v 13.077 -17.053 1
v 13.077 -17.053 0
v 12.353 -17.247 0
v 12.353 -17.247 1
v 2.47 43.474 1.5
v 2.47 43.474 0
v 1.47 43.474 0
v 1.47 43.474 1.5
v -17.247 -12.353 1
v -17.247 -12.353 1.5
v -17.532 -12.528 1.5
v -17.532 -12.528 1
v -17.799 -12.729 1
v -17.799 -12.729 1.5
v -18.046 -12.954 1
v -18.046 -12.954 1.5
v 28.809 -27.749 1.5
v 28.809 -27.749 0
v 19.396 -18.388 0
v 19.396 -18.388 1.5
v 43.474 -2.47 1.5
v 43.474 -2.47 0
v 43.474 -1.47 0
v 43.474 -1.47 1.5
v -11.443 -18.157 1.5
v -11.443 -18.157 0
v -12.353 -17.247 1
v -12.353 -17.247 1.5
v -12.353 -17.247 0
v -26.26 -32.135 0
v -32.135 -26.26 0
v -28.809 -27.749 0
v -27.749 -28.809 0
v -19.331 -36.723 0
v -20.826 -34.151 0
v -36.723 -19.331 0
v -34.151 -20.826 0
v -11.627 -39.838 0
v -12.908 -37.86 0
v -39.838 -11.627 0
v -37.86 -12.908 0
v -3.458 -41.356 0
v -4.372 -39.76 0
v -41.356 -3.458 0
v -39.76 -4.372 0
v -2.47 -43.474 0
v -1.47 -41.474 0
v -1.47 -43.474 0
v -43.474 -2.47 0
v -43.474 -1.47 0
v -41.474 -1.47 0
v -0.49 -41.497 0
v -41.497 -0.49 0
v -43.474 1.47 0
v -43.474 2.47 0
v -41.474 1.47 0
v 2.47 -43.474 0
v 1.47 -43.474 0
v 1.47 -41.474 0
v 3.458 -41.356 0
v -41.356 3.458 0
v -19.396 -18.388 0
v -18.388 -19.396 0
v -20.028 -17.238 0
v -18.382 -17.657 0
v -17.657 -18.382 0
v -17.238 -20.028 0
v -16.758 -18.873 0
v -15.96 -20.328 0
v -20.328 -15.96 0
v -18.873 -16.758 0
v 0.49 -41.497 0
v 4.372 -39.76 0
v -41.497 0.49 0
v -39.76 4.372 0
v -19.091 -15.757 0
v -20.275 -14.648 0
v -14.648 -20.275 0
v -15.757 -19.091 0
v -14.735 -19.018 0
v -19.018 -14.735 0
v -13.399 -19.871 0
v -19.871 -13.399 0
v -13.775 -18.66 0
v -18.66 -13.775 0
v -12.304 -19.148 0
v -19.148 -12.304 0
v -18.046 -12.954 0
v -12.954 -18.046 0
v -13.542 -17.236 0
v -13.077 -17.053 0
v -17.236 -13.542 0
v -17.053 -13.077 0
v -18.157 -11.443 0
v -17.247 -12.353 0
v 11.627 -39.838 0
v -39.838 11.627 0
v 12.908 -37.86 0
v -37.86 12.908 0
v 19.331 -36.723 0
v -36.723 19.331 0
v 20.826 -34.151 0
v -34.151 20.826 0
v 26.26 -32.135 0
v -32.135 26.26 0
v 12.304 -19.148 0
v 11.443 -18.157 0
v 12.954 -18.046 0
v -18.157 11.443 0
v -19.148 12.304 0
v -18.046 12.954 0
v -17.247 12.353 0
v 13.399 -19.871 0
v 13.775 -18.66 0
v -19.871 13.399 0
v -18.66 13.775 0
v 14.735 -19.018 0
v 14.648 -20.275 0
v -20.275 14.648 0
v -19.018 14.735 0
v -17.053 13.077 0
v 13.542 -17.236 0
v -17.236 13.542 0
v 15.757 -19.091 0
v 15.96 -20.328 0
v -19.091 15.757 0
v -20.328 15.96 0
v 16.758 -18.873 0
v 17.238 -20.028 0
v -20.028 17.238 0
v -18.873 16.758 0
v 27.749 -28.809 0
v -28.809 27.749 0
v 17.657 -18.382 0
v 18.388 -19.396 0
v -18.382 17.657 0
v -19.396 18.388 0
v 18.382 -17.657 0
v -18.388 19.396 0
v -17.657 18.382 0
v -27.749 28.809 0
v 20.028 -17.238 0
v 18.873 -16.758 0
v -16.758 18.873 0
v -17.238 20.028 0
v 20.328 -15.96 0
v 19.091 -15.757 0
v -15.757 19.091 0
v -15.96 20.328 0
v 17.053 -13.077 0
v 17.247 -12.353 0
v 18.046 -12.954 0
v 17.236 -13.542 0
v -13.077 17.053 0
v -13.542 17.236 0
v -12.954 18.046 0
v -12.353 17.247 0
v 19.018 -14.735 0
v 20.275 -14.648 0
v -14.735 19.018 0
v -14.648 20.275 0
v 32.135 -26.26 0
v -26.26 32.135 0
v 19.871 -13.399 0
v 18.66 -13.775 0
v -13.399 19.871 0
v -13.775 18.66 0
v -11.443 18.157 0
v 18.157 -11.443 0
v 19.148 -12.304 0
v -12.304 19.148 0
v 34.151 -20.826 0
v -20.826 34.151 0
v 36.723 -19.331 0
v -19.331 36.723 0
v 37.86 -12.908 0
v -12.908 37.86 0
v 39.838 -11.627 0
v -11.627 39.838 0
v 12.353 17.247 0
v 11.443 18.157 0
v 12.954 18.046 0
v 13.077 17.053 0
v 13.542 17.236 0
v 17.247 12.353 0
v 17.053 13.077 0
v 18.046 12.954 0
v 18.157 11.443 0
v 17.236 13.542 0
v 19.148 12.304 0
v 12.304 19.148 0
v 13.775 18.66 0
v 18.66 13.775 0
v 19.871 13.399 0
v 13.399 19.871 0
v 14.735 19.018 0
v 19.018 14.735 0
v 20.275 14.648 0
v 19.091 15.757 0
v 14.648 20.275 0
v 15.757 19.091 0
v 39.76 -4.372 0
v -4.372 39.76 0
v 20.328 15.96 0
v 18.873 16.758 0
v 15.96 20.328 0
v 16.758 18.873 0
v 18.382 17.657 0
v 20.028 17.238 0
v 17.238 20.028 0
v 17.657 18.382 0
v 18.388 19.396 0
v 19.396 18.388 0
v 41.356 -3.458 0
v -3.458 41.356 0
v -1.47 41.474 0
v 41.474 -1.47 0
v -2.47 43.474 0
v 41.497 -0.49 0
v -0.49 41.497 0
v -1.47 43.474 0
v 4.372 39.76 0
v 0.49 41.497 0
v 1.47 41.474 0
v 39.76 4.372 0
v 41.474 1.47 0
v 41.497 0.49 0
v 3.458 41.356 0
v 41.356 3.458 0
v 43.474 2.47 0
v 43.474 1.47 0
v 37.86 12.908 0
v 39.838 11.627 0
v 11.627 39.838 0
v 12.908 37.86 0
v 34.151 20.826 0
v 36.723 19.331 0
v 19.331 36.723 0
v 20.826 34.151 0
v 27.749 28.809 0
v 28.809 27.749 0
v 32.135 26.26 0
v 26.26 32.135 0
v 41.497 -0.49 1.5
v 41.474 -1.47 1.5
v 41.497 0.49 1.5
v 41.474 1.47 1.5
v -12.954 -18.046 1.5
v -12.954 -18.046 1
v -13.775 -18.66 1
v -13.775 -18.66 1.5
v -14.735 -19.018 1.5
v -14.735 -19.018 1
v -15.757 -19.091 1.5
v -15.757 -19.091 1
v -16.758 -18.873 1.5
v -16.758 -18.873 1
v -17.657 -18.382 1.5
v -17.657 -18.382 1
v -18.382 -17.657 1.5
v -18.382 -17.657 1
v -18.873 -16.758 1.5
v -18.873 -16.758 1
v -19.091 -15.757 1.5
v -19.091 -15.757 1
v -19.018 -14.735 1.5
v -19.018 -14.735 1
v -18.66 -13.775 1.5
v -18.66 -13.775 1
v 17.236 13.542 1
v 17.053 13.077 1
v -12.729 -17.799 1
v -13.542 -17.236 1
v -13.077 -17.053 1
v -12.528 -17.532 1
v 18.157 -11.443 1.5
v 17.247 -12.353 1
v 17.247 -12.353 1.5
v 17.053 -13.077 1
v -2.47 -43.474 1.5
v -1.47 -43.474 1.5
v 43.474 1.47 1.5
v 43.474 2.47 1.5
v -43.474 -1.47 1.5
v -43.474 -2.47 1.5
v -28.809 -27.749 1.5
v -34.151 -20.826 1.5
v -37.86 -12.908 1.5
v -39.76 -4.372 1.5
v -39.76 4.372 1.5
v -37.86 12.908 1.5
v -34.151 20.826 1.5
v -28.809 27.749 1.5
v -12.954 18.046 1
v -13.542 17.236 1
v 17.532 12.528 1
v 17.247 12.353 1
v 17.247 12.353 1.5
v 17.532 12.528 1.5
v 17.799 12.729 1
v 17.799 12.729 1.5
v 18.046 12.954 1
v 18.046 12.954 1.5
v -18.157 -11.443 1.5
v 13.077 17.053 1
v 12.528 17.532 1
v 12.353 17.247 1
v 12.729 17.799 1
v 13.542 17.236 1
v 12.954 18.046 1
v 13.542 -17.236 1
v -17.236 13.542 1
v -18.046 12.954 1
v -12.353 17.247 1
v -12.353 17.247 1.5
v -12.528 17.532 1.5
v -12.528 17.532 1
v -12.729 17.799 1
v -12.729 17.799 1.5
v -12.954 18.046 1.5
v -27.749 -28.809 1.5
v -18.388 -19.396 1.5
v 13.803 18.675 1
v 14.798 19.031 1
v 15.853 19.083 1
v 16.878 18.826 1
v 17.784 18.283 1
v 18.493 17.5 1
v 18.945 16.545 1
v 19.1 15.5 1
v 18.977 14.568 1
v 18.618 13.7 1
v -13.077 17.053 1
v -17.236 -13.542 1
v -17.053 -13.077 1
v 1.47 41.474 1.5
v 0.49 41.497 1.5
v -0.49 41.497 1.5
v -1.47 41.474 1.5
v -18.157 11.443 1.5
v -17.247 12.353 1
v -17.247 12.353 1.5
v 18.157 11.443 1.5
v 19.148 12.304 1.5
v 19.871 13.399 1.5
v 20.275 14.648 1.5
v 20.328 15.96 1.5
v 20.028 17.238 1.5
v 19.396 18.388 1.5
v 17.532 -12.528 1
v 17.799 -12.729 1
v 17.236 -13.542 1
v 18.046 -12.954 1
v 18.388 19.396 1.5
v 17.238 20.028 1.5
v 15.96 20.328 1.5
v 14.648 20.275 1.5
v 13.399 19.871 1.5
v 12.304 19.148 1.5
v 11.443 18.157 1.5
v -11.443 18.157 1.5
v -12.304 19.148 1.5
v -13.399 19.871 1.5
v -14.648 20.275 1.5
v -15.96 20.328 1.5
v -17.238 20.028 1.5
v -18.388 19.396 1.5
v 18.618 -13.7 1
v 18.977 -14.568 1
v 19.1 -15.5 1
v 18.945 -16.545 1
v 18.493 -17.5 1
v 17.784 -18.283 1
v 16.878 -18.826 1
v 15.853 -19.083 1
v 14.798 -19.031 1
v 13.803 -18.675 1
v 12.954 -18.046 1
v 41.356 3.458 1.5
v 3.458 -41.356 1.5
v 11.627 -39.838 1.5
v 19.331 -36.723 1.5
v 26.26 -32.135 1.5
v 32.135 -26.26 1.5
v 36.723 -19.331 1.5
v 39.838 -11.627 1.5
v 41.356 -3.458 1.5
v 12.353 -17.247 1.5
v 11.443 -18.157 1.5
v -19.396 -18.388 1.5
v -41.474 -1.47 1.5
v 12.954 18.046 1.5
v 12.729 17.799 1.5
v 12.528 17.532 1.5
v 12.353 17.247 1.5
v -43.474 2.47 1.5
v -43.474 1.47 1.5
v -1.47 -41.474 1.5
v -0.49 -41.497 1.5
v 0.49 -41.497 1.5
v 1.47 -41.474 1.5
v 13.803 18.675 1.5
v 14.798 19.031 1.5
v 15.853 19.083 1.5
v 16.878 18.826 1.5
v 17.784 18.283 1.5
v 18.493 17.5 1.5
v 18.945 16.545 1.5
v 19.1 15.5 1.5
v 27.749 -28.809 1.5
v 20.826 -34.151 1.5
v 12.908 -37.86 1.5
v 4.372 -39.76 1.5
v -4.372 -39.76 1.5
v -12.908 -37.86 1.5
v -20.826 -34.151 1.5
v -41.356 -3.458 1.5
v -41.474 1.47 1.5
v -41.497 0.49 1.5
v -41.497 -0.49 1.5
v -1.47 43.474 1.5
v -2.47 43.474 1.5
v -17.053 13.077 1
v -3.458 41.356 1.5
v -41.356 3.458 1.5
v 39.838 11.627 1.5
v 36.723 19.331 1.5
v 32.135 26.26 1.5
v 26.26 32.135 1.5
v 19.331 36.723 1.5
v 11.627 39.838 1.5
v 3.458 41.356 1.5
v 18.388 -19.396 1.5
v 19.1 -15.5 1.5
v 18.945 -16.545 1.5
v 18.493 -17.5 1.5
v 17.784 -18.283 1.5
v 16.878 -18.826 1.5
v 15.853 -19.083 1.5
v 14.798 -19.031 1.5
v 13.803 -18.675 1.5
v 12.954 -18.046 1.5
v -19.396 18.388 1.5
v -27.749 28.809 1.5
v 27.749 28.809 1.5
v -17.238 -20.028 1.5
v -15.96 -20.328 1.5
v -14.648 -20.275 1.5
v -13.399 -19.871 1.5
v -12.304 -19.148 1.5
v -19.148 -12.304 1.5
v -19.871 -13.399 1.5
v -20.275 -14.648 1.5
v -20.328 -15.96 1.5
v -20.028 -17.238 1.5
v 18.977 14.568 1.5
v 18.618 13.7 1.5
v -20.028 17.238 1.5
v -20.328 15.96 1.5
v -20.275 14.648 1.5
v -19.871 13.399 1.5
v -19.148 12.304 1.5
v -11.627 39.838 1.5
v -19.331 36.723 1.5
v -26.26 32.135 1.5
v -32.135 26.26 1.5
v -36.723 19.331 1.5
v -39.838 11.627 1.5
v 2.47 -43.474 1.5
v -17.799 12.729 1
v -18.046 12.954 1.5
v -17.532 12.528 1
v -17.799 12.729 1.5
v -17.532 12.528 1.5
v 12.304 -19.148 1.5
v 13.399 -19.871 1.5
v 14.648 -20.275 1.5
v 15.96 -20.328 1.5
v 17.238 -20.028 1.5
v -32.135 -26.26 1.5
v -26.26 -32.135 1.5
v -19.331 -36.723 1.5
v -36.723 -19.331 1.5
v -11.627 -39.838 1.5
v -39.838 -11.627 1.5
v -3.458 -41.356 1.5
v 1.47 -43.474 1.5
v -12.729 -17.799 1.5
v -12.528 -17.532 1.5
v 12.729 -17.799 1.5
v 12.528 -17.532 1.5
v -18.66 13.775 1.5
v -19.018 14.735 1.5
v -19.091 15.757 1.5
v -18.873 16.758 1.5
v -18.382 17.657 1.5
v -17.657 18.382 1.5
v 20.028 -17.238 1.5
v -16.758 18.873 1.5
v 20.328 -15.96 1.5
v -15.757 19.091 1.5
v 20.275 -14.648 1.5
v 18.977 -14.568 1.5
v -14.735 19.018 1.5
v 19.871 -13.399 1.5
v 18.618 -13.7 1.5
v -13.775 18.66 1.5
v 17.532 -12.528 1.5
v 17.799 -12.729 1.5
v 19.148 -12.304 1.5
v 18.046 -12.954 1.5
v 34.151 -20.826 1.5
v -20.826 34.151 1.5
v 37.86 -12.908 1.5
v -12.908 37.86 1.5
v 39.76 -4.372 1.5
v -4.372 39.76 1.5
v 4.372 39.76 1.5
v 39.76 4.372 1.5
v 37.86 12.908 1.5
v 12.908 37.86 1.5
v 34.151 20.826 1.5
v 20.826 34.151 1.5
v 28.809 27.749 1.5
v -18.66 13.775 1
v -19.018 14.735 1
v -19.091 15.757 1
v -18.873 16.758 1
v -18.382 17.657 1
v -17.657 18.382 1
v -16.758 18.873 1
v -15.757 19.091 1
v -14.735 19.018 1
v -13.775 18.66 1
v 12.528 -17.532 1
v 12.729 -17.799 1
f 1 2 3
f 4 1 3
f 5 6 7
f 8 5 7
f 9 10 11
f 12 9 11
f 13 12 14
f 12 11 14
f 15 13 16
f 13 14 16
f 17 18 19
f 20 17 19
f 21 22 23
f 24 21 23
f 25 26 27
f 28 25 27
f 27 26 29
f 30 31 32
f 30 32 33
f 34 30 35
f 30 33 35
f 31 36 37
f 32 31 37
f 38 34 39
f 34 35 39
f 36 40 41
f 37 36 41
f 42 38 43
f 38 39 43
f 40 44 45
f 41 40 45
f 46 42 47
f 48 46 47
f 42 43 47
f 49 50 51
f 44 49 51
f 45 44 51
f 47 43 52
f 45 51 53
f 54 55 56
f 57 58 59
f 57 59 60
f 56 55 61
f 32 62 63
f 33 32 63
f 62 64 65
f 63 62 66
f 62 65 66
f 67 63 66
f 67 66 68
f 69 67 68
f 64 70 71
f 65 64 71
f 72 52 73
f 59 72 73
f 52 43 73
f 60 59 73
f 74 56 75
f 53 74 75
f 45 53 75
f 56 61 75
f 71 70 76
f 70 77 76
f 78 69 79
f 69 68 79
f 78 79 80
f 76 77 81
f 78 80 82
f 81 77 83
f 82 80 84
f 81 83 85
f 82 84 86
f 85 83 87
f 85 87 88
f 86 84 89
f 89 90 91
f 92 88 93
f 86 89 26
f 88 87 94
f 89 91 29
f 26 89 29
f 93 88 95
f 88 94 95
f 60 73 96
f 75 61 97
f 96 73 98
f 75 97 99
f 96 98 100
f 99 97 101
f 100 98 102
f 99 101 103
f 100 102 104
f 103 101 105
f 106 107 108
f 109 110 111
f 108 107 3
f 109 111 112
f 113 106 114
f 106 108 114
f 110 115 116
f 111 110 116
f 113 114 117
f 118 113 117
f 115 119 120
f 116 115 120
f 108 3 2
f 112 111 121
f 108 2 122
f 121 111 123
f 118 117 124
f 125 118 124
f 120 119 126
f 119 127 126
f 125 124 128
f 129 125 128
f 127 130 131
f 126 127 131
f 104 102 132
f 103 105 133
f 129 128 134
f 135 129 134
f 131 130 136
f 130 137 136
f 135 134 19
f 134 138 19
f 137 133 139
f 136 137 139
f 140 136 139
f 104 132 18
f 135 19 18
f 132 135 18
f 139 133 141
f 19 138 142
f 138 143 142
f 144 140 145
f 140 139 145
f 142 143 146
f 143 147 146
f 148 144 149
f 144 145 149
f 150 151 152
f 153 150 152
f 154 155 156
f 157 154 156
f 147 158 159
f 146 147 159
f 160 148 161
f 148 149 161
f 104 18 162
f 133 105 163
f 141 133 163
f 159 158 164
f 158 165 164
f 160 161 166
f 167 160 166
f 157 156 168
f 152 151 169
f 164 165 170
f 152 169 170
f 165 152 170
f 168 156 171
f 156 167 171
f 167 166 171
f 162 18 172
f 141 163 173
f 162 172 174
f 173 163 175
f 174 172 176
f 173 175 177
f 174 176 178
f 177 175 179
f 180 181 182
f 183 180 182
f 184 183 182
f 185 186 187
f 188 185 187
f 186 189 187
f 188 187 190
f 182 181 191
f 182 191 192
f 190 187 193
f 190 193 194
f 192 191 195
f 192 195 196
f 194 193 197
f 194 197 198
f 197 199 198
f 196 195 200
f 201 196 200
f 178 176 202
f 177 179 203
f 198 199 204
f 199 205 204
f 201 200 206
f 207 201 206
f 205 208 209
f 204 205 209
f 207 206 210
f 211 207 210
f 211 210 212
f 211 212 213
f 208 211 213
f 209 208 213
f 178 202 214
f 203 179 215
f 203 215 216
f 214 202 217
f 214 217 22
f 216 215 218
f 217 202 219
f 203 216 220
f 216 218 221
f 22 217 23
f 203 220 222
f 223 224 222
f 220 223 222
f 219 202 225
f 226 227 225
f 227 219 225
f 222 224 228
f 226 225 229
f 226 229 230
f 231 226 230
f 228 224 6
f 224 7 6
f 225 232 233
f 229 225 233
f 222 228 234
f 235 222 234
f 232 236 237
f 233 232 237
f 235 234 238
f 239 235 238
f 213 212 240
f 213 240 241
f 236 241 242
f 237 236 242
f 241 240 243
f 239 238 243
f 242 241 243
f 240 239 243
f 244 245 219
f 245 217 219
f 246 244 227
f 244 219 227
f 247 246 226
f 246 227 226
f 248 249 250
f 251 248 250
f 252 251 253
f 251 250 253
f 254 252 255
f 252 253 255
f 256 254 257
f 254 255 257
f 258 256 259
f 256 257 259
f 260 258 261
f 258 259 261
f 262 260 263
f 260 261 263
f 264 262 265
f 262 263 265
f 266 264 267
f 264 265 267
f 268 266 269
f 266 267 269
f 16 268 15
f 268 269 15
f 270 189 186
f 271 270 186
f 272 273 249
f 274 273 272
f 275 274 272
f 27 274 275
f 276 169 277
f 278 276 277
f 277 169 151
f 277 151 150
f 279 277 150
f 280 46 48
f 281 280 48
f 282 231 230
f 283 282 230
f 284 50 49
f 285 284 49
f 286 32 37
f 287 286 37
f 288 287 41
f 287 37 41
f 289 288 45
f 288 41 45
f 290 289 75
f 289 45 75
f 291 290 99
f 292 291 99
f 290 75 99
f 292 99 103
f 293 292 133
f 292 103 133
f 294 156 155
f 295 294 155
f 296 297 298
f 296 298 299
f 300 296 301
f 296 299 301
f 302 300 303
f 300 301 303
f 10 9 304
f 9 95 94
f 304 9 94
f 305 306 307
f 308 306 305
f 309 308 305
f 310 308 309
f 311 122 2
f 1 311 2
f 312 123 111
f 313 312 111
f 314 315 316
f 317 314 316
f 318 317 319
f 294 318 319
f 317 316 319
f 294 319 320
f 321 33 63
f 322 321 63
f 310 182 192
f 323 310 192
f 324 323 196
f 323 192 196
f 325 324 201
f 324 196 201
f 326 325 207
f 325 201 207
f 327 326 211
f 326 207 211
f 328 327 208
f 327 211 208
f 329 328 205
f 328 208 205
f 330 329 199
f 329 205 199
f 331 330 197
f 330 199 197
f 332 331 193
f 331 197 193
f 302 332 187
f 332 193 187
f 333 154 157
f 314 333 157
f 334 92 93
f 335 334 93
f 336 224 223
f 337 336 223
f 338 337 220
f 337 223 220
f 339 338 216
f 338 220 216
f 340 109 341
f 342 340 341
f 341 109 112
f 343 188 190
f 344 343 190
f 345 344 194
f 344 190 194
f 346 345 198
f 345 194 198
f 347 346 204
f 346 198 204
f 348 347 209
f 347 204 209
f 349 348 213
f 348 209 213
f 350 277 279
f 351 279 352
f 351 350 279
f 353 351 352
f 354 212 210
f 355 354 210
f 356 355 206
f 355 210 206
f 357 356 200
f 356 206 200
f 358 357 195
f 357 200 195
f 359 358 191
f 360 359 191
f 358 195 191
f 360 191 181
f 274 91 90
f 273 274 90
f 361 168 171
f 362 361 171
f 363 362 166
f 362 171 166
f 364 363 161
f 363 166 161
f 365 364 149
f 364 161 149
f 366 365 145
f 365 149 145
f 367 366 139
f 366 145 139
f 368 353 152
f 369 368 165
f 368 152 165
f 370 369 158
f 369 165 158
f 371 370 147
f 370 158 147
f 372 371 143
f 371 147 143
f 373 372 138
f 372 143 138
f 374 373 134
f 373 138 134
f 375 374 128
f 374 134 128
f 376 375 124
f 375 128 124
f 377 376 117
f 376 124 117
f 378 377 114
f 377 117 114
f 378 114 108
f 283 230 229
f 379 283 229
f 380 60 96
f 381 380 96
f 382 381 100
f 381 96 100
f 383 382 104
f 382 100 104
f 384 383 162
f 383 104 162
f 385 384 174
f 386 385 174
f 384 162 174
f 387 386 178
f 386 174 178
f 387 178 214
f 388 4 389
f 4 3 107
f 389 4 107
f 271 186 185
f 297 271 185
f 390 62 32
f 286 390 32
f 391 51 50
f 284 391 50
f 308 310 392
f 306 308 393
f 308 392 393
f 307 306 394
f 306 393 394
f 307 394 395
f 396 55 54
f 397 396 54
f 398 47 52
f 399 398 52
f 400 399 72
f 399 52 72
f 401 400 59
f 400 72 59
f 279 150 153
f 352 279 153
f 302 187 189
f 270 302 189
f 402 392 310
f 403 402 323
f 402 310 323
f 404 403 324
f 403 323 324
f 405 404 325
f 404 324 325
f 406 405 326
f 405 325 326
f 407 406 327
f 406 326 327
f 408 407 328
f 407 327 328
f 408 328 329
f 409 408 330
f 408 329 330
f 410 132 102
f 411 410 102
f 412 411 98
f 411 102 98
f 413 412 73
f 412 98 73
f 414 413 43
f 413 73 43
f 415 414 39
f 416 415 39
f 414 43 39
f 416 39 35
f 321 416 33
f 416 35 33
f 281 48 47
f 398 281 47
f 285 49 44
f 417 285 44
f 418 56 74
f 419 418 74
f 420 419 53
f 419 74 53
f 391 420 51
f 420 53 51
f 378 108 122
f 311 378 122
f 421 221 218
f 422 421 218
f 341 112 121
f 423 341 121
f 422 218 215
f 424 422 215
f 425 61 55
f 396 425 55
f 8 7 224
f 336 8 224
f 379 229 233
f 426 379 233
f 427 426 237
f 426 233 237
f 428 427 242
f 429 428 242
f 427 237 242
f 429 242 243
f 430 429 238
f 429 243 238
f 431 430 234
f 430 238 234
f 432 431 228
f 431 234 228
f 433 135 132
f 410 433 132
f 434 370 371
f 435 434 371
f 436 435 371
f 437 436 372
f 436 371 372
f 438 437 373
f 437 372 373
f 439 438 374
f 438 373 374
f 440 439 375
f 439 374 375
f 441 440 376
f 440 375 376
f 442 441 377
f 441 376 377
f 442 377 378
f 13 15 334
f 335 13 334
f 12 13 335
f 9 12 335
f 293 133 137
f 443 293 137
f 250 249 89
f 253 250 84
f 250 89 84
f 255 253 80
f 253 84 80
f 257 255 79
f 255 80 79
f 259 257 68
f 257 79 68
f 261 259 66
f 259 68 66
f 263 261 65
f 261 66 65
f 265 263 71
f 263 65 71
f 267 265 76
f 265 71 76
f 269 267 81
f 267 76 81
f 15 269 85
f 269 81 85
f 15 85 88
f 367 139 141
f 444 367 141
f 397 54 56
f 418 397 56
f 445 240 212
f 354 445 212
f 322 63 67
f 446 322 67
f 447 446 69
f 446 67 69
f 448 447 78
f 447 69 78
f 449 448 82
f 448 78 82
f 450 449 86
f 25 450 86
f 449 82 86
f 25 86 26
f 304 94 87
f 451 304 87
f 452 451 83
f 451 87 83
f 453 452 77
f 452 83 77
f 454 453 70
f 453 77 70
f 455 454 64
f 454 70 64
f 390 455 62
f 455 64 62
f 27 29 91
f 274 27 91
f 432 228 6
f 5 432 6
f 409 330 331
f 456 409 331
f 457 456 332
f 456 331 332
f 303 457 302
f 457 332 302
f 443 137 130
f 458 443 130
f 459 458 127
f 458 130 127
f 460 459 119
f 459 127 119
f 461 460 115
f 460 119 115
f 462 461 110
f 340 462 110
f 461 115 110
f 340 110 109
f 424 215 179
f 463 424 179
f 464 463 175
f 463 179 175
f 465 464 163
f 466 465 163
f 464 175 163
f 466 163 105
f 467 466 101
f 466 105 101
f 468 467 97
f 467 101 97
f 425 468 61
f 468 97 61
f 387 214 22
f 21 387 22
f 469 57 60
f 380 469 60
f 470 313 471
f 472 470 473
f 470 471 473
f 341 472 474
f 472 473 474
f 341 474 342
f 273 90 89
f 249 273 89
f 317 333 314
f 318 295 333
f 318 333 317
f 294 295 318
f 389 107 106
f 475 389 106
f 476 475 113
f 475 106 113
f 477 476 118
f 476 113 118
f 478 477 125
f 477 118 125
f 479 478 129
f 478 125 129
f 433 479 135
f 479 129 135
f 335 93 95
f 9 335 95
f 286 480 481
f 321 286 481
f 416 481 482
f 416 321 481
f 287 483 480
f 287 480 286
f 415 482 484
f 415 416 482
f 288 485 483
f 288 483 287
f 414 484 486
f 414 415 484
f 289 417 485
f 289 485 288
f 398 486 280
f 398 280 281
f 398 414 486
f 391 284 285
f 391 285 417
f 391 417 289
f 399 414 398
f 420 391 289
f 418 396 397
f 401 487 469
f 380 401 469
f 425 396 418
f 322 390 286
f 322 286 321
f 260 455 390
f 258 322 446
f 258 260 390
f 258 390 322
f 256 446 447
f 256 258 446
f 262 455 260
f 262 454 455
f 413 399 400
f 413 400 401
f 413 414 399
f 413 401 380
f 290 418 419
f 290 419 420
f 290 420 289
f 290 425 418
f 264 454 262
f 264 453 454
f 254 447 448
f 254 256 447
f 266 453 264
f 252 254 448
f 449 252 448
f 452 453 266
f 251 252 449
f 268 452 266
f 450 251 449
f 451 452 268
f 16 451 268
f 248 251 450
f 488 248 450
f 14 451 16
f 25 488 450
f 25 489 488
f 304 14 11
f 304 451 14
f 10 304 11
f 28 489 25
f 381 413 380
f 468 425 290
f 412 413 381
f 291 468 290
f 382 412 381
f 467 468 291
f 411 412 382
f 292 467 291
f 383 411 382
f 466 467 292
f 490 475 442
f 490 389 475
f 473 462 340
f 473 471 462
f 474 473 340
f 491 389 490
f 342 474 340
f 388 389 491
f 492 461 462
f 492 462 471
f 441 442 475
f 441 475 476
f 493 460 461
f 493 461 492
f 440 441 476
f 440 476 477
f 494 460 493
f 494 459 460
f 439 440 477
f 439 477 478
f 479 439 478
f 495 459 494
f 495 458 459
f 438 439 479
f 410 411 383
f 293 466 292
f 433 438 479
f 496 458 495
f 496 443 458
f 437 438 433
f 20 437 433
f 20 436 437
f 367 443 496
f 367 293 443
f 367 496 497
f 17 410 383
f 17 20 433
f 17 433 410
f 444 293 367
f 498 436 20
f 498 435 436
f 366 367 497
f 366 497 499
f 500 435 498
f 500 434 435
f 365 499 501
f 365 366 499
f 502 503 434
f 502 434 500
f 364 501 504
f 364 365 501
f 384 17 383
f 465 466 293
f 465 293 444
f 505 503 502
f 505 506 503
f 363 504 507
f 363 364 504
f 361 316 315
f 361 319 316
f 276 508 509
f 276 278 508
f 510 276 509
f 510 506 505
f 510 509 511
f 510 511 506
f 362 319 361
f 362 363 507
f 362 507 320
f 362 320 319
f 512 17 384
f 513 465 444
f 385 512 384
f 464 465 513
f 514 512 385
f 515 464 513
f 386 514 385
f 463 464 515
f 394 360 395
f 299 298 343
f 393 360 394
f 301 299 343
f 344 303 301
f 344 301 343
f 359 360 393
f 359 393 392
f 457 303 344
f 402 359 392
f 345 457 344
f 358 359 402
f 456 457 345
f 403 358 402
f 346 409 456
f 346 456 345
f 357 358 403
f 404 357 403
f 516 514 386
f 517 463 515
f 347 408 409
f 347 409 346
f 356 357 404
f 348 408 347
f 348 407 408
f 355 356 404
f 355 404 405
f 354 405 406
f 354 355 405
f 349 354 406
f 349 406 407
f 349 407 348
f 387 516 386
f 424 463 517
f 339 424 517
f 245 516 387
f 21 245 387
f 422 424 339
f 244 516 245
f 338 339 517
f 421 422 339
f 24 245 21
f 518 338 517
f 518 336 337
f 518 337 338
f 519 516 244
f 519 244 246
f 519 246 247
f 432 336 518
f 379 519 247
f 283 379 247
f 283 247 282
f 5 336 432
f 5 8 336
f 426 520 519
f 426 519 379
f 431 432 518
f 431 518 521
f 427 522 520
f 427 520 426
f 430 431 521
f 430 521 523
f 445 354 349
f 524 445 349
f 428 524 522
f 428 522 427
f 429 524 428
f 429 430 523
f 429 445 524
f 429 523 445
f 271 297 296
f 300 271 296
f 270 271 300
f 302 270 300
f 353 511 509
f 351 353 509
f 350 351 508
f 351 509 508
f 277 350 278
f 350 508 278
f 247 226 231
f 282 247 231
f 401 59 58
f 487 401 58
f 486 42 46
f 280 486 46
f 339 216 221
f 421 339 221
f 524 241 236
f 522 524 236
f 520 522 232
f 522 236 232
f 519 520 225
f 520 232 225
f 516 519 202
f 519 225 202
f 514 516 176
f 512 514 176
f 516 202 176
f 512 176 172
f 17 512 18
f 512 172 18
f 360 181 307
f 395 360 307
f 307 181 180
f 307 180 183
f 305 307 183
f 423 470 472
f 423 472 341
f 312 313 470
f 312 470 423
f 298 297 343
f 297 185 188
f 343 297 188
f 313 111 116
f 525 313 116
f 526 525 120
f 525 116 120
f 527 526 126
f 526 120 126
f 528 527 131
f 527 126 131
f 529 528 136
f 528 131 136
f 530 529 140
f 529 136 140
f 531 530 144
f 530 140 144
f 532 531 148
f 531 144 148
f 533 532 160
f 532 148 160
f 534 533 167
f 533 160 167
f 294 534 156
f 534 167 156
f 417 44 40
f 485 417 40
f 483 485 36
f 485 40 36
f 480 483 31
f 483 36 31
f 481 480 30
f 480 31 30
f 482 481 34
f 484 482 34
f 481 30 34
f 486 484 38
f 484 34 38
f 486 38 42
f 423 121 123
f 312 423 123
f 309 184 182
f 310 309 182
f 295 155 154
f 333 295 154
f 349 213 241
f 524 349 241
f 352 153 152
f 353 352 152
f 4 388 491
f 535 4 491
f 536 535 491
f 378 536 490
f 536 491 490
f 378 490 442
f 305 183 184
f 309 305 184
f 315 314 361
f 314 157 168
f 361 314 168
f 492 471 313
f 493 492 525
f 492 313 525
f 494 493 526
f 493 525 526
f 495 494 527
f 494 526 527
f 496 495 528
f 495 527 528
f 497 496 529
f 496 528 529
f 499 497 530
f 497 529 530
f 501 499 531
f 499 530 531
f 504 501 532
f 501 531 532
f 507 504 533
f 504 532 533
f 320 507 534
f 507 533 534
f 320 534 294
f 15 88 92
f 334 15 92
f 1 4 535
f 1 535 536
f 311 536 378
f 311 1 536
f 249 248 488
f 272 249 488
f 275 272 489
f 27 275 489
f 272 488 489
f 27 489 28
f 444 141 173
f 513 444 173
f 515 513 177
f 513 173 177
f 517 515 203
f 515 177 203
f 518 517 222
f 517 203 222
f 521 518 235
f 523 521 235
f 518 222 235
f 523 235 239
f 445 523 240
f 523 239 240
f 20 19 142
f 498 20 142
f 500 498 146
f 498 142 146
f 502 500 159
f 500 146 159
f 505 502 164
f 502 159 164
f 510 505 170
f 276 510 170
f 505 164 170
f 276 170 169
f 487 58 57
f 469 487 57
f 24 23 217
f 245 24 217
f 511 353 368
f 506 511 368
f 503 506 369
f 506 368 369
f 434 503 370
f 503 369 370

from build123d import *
from build123d import SkipClean  # not in build123d's __all__

# Parameters (mm, degrees)
F1_R     = 41.5
F3_DEPTH = 1.5
F4_DEPTH = 1.5
F5_R     = 3.6
F6_DEPTH = 0.5


with BuildPart() as f3:
    # F1 (on face) → F3 (new body)
    with BuildSketch(Plane.XY):
        Circle(F1_R)
        with BuildLine():
            Line((-17.2474476501, 12.3525523499), (-17.0531188132, 13.0769391962))
            Line((-17.0531188132, 13.0769391962), (-17.2364935, 13.5420990873))
            Line((-17.2364935, 13.5420990873), (-18.0455844123, 12.9544155877))
            ThreePointArc((-18.0455844123, 12.9544155877), (-18.0455844123, 18.0455844123), (-12.9544155877, 18.0455844123))
            Line((-12.9544155877, 18.0455844123), (-13.5420990873, 17.2364935))
            Line((-13.5420990873, 17.2364935), (-13.0769391962, 17.0531188132))
            Line((-13.0769391962, 17.0531188132), (-12.3525523499, 17.2474476501))
            Line((-12.3525523499, 17.2474476501), (-11.442760334, 18.1573118546))
            ThreePointArc((-11.442760334, 18.1573118546), (-14.6482964144, 20.2746309807), (-18.3882088979, 19.3962481135))
            Line((-18.3882088979, 19.3962481135), (-27.7493051541, 28.8093051541))
            ThreePointArc((-27.7493051541, 28.8093051541), (0, 40), (27.7493051541, 28.8093051541))
            Line((27.7493051541, 28.8093051541), (18.3882088979, 19.3962481135))
            ThreePointArc((18.3882088979, 19.3962481135), (14.6483525281, 20.27464099), (11.442822795, 18.1574072189))
            Line((11.442822795, 18.1574072189), (12.3525523499, 17.2474476501))
            Line((12.3525523499, 17.2474476501), (13.0769391962, 17.0531188132))
            Line((13.0769391962, 17.0531188132), (13.5420990873, 17.2364935))
            Line((13.5420990873, 17.2364935), (12.9544155877, 18.0455844123))
            ThreePointArc((12.9544155877, 18.0455844123), (18.0455844123, 18.0455844123), (18.0455844123, 12.9544155877))
            Line((18.0455844123, 12.9544155877), (17.2364935, 13.5420990873))
            Line((17.2364935, 13.5420990873), (17.0531188132, 13.0769391962))
            Line((17.0531188132, 13.0769391962), (17.2474476501, 12.3525523499))
            Line((17.2474476501, 12.3525523499), (18.1573118546, 11.442760334))
            ThreePointArc((18.1573118546, 11.442760334), (20.2746309807, 14.6482964144), (19.3962481135, 18.3882088979))
            Line((19.3962481135, 18.3882088979), (28.8093051541, 27.7493051541))
            ThreePointArc((28.8093051541, 27.7493051541), (40, 0), (28.8093051541, -27.7493051541))
            Line((28.8093051541, -27.7493051541), (19.3962481135, -18.3882088979))
            ThreePointArc((19.3962481135, -18.3882088979), (20.27464099, -14.6483525281), (18.1574072189, -11.442822795))
            Line((18.1574072189, -11.442822795), (17.2474476501, -12.3525523499))
            Line((17.2474476501, -12.3525523499), (17.0531188132, -13.0769391962))
            Line((17.0531188132, -13.0769391962), (17.2364935, -13.5420990873))
            Line((17.2364935, -13.5420990873), (18.0455844123, -12.9544155877))
            ThreePointArc((18.0455844123, -12.9544155877), (18.0455844123, -18.0455844123), (12.9544155877, -18.0455844123))
            Line((12.9544155877, -18.0455844123), (13.5420990873, -17.2364935))
            Line((13.5420990873, -17.2364935), (13.0769391962, -17.0531188132))
            Line((13.0769391962, -17.0531188132), (12.3525523499, -17.2474476501))
            Line((12.3525523499, -17.2474476501), (11.442760334, -18.1573118546))
            ThreePointArc((11.442760334, -18.1573118546), (14.6482964144, -20.2746309807), (18.3882088979, -19.3962481135))
            Line((18.3882088979, -19.3962481135), (27.7493051541, -28.8093051541))
            ThreePointArc((27.7493051541, -28.8093051541), (0, -40), (-27.7493051541, -28.8093051541))
            Line((-27.7493051541, -28.8093051541), (-18.3882088979, -19.3962481135))
            ThreePointArc((-18.3882088979, -19.3962481135), (-14.6483525281, -20.27464099), (-11.442822795, -18.1574072189))
            Line((-11.442822795, -18.1574072189), (-12.3525523499, -17.2474476501))
            Line((-12.3525523499, -17.2474476501), (-13.0769391962, -17.0531188132))
            Line((-13.0769391962, -17.0531188132), (-13.5420990873, -17.2364935))
            Line((-13.5420990873, -17.2364935), (-12.9544155877, -18.0455844123))
            ThreePointArc((-12.9544155877, -18.0455844123), (-18.0455844123, -18.0455844123), (-18.0455844123, -12.9544155877))
            Line((-18.0455844123, -12.9544155877), (-17.2364935, -13.5420990873))
            Line((-17.2364935, -13.5420990873), (-17.0531188132, -13.0769391962))
            Line((-17.0531188132, -13.0769391962), (-17.2474476501, -12.3525523499))
            Line((-17.2474476501, -12.3525523499), (-18.1573118546, -11.442760334))
            ThreePointArc((-18.1573118546, -11.442760334), (-20.2746309807, -14.6482964144), (-19.3962481135, -18.3882088979))
            Line((-19.3962481135, -18.3882088979), (-28.8093051541, -27.7493051541))
            ThreePointArc((-28.8093051541, -27.7493051541), (-40, 0), (-28.8093051541, 27.7493051541))
            Line((-28.8093051541, 27.7493051541), (-19.3962481135, 18.3882088979))
            ThreePointArc((-19.3962481135, 18.3882088979), (-20.27464099, 14.6483525281), (-18.1574072189, 11.442822795))
            Line((-18.1574072189, 11.442822795), (-17.2474476501, 12.3525523499))
        make_face(mode=Mode.SUBTRACT)
    extrude(amount=F3_DEPTH)

    # F2 (on Top) → F4 (join)
    with BuildSketch(Plane.XY):
        Polygon((-1.47, 41.4739568886), (-1.47, 43.4739568886), (-2.47, 43.4739568886), (-3.4575279787, 41.3557190758), align=None)
        Polygon((2.47, 43.4739568886), (1.47, 43.4739568886), (1.47, 41.4739568886), (3.4575279787, 41.3557190758), align=None)
        Polygon((-43.4739568886, 2.47), (-43.4739568886, 1.47), (-41.4739568886, 1.47), (-41.3557190758, 3.4575279787), align=None)
        Polygon((-41.4739568886, -1.47), (-43.4739568886, -1.47), (-43.4739568886, -2.47), (-41.3557190758, -3.4575279787), align=None)
        Polygon((-2.47, -43.4739568886), (-1.47, -43.4739568886), (-1.47, -41.4739568886), (-3.4575279787, -41.3557190758), align=None)
        Polygon((1.47, -41.4739568886), (1.47, -43.4739568886), (2.47, -43.4739568886), (3.4575279787, -41.3557190758), align=None)
        Polygon((43.4739568886, -2.47), (43.4739568886, -1.47), (41.4739568886, -1.47), (41.3557190758, -3.4575279787), align=None)
        Polygon((41.4739568886, 1.47), (43.4739568886, 1.47), (43.4739568886, 2.47), (41.3557190758, 3.4575279787), align=None)
    extrude(amount=F4_DEPTH)

    # F5 (on face) → F6 (cut)
    with BuildSketch(Plane.XY.offset(1.5)):
        with Locations((-15.5, 15.5)):
            Circle(F5_R)
        with Locations((-15.5, -15.5)):
            Circle(F5_R)
        with Locations((15.5, -15.5)):
            Circle(F5_R)
        with Locations((15.5, 15.5)):
            Circle(F5_R)
    with SkipClean():  # cleaning this boolean's faces spoils the solid; the shape is the same uncleaned
        extrude(amount=-F6_DEPTH, mode=Mode.SUBTRACT)


solid = f3.part
